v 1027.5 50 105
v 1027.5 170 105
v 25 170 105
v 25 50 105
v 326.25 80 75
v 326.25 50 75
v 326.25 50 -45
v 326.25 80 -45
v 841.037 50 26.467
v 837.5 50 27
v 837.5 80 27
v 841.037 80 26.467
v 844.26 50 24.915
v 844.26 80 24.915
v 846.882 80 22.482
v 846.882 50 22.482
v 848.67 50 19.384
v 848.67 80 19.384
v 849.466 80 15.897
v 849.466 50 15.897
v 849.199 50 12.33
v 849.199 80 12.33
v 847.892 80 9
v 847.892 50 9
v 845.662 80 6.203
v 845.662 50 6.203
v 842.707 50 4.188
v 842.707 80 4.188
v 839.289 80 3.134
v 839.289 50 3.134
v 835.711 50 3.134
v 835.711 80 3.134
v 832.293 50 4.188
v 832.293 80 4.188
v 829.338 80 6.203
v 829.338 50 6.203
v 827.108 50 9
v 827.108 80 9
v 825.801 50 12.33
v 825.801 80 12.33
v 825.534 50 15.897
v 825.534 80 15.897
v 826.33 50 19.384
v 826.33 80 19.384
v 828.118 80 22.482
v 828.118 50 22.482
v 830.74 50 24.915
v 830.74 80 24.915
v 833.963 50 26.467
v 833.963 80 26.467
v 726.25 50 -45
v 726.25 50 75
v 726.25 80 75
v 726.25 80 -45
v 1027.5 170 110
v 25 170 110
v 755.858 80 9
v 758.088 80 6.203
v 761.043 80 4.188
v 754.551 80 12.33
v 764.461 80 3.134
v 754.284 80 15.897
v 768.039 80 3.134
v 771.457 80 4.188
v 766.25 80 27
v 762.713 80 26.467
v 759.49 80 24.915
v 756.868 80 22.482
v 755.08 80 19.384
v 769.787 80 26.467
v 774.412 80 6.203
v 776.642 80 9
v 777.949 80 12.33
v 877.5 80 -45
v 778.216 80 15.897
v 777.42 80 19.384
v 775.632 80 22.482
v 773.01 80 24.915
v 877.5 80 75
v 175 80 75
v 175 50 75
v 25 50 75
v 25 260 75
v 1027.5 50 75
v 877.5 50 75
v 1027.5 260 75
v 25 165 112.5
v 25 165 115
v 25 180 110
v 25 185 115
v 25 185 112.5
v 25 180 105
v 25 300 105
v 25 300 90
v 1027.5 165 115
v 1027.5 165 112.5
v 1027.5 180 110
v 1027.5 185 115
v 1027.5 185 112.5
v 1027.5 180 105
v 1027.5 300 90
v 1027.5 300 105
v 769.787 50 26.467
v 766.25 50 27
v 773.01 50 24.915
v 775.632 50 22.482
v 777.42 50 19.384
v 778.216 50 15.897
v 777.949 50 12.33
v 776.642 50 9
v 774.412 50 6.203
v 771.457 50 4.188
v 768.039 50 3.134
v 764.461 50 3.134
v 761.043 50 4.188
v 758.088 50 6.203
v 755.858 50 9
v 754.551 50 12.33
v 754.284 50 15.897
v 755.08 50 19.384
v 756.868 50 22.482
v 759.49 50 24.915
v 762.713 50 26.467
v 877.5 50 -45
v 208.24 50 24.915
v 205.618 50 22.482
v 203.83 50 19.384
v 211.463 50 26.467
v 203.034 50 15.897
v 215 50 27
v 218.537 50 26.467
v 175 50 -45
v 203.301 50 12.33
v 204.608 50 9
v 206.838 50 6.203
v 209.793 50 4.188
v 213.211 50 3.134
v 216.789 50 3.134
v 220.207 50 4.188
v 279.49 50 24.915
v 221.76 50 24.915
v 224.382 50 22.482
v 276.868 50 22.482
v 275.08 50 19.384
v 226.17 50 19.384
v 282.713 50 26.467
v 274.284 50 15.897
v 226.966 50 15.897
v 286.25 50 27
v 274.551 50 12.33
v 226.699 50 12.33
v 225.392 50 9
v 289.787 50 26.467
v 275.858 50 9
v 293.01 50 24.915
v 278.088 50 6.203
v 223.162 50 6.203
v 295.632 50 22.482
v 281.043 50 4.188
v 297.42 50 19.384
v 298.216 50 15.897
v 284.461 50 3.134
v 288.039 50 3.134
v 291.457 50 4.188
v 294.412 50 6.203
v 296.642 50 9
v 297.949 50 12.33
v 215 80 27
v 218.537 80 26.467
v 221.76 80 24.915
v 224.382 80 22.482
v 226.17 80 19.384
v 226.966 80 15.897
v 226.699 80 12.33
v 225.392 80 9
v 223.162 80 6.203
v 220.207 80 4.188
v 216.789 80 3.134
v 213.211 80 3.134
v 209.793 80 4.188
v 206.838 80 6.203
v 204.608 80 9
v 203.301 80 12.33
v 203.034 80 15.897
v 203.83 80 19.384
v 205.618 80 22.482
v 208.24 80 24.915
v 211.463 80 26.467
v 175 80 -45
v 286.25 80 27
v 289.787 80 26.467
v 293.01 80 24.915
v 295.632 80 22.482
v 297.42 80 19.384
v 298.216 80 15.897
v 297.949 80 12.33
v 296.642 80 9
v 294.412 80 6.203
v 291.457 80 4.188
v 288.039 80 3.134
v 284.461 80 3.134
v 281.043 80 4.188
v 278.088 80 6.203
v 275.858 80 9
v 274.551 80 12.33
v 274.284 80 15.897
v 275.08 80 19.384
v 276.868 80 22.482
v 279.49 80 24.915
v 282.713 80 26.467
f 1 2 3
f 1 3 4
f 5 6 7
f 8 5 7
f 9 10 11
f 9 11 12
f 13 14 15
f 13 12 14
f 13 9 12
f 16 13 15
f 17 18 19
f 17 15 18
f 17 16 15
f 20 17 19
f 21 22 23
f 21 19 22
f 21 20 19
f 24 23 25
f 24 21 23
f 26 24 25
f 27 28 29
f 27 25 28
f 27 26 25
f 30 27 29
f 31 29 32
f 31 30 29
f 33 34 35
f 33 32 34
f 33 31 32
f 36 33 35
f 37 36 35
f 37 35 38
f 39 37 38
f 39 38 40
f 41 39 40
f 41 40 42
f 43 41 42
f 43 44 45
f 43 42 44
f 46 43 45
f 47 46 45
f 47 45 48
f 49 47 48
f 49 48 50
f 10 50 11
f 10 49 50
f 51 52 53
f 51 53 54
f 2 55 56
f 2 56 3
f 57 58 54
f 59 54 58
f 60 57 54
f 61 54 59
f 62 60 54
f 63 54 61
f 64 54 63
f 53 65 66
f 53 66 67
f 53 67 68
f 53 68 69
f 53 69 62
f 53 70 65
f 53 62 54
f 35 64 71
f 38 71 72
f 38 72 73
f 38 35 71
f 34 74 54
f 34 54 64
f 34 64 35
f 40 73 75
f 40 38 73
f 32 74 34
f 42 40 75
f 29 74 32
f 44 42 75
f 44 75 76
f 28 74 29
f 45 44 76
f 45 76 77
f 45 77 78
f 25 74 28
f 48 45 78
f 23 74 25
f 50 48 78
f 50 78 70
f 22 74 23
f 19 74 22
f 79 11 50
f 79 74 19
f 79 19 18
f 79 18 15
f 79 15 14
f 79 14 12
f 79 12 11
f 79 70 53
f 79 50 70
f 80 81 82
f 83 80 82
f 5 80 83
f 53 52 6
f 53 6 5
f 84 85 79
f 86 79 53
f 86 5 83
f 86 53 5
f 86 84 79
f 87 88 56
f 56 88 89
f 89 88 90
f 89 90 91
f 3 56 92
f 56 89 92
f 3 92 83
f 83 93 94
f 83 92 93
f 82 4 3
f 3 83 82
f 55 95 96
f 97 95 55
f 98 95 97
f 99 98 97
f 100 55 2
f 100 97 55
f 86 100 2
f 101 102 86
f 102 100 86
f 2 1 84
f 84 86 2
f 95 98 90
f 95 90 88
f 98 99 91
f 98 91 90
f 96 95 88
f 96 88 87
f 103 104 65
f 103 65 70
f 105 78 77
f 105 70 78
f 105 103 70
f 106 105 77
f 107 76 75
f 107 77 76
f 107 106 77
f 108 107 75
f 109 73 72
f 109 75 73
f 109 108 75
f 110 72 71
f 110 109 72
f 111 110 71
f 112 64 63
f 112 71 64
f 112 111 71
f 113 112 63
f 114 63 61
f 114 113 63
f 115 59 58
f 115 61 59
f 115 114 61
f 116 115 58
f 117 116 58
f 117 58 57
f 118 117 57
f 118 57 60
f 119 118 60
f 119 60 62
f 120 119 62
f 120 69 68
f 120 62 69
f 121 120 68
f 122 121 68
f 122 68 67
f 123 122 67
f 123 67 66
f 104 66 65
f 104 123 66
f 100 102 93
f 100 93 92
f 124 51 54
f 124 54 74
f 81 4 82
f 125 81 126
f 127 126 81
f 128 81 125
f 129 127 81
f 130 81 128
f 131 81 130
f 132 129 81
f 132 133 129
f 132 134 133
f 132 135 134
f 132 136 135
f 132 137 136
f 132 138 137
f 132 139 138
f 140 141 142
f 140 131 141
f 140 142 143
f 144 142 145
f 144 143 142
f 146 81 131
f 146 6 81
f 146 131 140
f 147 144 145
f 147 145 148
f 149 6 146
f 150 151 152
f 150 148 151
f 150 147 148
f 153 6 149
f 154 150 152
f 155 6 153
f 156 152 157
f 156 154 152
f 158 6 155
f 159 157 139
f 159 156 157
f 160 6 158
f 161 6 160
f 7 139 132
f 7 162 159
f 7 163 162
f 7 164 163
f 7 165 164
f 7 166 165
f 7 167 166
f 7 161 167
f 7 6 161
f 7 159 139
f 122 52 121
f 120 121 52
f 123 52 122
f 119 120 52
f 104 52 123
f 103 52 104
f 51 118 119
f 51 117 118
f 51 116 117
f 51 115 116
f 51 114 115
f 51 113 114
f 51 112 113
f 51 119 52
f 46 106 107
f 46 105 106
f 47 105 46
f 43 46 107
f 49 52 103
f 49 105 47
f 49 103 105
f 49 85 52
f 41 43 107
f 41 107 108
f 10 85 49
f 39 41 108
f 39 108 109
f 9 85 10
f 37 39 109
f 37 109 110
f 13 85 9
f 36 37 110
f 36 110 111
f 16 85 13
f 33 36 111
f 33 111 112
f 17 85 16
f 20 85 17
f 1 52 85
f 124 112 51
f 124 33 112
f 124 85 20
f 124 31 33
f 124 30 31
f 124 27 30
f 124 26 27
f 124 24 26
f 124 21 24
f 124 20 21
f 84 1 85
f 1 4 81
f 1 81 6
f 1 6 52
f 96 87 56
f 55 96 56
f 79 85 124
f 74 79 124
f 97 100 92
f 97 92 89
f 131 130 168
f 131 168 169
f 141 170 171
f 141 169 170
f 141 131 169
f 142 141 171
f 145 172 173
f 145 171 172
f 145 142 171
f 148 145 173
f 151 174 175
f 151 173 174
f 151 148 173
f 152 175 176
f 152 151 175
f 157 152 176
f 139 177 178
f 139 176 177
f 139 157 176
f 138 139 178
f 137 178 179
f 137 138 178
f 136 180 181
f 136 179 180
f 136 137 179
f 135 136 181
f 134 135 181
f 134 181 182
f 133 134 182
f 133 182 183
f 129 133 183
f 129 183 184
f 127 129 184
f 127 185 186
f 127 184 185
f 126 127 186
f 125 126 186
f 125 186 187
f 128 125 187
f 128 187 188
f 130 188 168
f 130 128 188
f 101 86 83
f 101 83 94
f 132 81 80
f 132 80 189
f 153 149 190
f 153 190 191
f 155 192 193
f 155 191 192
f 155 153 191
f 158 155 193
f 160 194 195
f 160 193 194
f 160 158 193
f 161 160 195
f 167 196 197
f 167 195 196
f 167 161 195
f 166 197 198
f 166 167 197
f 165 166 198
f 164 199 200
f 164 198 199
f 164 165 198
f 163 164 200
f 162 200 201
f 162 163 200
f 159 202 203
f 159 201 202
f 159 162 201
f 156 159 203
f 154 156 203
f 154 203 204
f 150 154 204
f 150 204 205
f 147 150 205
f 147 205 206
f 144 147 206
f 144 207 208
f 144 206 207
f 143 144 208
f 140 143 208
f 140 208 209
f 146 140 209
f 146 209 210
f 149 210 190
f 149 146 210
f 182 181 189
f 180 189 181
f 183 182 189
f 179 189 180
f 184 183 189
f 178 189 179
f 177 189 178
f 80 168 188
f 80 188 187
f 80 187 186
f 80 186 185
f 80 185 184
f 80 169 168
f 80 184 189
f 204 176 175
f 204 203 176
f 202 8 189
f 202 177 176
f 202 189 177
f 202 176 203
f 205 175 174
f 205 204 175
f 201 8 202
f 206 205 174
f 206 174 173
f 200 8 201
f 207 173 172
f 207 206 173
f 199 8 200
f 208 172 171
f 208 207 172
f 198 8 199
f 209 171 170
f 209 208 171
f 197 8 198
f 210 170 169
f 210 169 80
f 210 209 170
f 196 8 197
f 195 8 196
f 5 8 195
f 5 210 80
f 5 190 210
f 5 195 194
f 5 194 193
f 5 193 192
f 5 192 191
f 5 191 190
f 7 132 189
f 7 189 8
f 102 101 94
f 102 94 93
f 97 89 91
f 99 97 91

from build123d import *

# Parameters (mm, degrees)
EXTRUDE_1_DEPTH          = 1002.5
CUT_EXTRUDE_1_DEPTH      = 1058.062557278
CUT_EXTRUDE_1_DEPTH_BACK = 1058.062557278
SKETCH_2_W               = 400
SKETCH_2_H               = 185
CUT_EXTRUDE_2_DEPTH      = 1058.062557278
CUT_EXTRUDE_2_DEPTH_BACK = 1058.062557278
SKETCH_3_W               = 150
SKETCH_3_H               = 185
CUT_EXTRUDE_3_DEPTH      = 1058.062557278
CUT_EXTRUDE_3_DEPTH_BACK = 1058.062557278
SKETCH_8_W               = 931.455516369
SKETCH_8_H               = 180.779532171
CUT_EXTRUDE_4_DEPTH      = 1058.062557278
CUT_EXTRUDE_4_DEPTH_BACK = 1058.062557278
SKETCH_9_R               = 12


with BuildPart() as part:
    # 草图1 → 凸台-拉伸1 (new body)
    with BuildSketch(Plane(origin=(1027.5, 0, 0), x_dir=(0, 0, -1), z_dir=(1, 0, 0))):
        Polygon((-105, 300), (-105, 180), (-110, 180), (-112.5, 185), (-115, 185), (-115, 165), (-112.5, 165), (-110, 170), (-105, 170), (-105, 50), (-75, 50), (110, 50), (110, 80), (-75, 80), (-75, 260), (-90, 300), align=None)
    extrude(amount=-EXTRUDE_1_DEPTH)

    # 草图2 → 切除-拉伸1 (cut, two sides: drawn at the far end of the back side and taken through both)
    with BuildSketch(Plane(origin=(0, 80, 0), x_dir=(1, 0, 0), z_dir=(0, 1, 0)).offset(-CUT_EXTRUDE_1_DEPTH_BACK)):
        with Locations((526.25, 17.5)):
            Rectangle(SKETCH_2_W, SKETCH_2_H)
    extrude(amount=CUT_EXTRUDE_1_DEPTH + CUT_EXTRUDE_1_DEPTH_BACK, mode=Mode.SUBTRACT)

    # 草图3 → 切除-拉伸2 (cut, two sides: drawn at the far end of the back side and taken through both)
    with BuildSketch(Plane(origin=(0, 80, 0), x_dir=(1, 0, 0), z_dir=(0, 1, 0)).offset(-CUT_EXTRUDE_2_DEPTH_BACK)):
        with Locations((100, 17.5)):
            Rectangle(SKETCH_3_W, SKETCH_3_H)
        with Locations((952.5, 17.5)):
            Rectangle(SKETCH_3_W, SKETCH_3_H)
    extrude(amount=CUT_EXTRUDE_2_DEPTH + CUT_EXTRUDE_2_DEPTH_BACK, mode=Mode.SUBTRACT)

    # 草图8 → 切除-拉伸3 (cut, two sides: drawn at the far end of the back side and taken through both)
    with BuildSketch(Plane(origin=(0, 80, 0), x_dir=(1, 0, 0), z_dir=(0, 1, 0)).offset(-CUT_EXTRUDE_3_DEPTH_BACK)):
        with Locations((511.159415891, 135.389766086)):
            Rectangle(SKETCH_8_W, SKETCH_8_H)
    extrude(amount=CUT_EXTRUDE_3_DEPTH + CUT_EXTRUDE_3_DEPTH_BACK, mode=Mode.SUBTRACT)

    # 草图9 → 切除-拉伸4 (cut, two sides: drawn at the far end of the back side and taken through both)
    with BuildSketch(Plane(origin=(0, 80, 0), x_dir=(1, 0, 0), z_dir=(0, 1, 0)).offset(-CUT_EXTRUDE_4_DEPTH_BACK)):
        with Locations(Location((215, -15, 0), (0, 0, 270))):
            Circle(SKETCH_9_R)
        with Locations(Location((286.25, -15, 0), (0, 0, 270))):
            Circle(SKETCH_9_R)
        with Locations(Location((766.25, -15, 0), (0, 0, 270))):
            Circle(SKETCH_9_R)
        with Locations(Location((837.5, -15, 0), (0, 0, 270))):
            Circle(SKETCH_9_R)
    extrude(amount=CUT_EXTRUDE_4_DEPTH + CUT_EXTRUDE_4_DEPTH_BACK, mode=Mode.SUBTRACT)


solid = part.part
